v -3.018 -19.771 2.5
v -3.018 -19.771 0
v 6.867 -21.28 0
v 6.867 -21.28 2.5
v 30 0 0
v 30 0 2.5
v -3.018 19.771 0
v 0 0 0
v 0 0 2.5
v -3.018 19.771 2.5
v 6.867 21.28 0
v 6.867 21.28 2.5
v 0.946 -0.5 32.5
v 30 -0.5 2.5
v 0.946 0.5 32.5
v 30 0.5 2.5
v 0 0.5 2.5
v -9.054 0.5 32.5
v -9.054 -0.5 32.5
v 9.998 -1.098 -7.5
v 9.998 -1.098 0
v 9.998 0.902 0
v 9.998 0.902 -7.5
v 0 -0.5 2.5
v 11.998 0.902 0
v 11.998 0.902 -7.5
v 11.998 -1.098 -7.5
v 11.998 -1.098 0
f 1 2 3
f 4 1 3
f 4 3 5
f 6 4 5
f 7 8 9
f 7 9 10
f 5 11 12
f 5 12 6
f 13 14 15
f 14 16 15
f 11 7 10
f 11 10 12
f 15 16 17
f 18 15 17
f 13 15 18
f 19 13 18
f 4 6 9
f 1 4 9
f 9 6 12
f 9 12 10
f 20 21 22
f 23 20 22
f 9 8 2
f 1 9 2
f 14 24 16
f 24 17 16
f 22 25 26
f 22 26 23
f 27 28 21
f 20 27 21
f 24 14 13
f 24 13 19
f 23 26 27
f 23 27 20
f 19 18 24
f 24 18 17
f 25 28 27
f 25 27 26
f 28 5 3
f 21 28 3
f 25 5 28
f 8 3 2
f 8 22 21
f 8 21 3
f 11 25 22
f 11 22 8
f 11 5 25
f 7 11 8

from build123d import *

# Parameters (mm, degrees)
BOSS_EXTRUDE1_DEPTH = 2.5
BOSS_EXTRUDE2_DEPTH = 0.5
SKETCH5_W           = 2
SKETCH5_H           = 2
BOSS_EXTRUDE3_DEPTH = 7.5


with BuildPart() as part:
    # Sketch3 → Boss-Extrude1 (new body)
    with BuildSketch(Plane.XY):
        Polygon((6.867406349, 21.280007755), (30, 0), (0, 0), (-3.018078023, 19.770968743), align=None)
        Polygon((-3.018078023, -19.770968743), (6.867406349, -21.280007755), (30, 0), (0, 0), align=None)
    extrude(amount=BOSS_EXTRUDE1_DEPTH)

    # Sketch5 → Boss-Extrude3 (add)
    with BuildSketch(Plane(origin=(0, 0, 0), x_dir=(-1, 0, 0), z_dir=(0, 0, -1))):
        with Locations((-10.9980603, -0.098027413)):
            Rectangle(SKETCH5_W, SKETCH5_H)
    extrude(amount=BOSS_EXTRUDE3_DEPTH)


with BuildPart() as body_2:
    # Sketch4 → Boss-Extrude2 (new, symmetric)
    with BuildSketch(Plane(origin=(0, 0, 0), x_dir=(1, 0, 0), z_dir=(0, 1, 0))):
        Polygon((-9.054234069, -32.5), (0, -2.5), (30, -2.5), (0.945765931, -32.5), align=None)
    extrude(amount=BOSS_EXTRUDE2_DEPTH, both=True)


solid = Compound([part.part, body_2.part])
